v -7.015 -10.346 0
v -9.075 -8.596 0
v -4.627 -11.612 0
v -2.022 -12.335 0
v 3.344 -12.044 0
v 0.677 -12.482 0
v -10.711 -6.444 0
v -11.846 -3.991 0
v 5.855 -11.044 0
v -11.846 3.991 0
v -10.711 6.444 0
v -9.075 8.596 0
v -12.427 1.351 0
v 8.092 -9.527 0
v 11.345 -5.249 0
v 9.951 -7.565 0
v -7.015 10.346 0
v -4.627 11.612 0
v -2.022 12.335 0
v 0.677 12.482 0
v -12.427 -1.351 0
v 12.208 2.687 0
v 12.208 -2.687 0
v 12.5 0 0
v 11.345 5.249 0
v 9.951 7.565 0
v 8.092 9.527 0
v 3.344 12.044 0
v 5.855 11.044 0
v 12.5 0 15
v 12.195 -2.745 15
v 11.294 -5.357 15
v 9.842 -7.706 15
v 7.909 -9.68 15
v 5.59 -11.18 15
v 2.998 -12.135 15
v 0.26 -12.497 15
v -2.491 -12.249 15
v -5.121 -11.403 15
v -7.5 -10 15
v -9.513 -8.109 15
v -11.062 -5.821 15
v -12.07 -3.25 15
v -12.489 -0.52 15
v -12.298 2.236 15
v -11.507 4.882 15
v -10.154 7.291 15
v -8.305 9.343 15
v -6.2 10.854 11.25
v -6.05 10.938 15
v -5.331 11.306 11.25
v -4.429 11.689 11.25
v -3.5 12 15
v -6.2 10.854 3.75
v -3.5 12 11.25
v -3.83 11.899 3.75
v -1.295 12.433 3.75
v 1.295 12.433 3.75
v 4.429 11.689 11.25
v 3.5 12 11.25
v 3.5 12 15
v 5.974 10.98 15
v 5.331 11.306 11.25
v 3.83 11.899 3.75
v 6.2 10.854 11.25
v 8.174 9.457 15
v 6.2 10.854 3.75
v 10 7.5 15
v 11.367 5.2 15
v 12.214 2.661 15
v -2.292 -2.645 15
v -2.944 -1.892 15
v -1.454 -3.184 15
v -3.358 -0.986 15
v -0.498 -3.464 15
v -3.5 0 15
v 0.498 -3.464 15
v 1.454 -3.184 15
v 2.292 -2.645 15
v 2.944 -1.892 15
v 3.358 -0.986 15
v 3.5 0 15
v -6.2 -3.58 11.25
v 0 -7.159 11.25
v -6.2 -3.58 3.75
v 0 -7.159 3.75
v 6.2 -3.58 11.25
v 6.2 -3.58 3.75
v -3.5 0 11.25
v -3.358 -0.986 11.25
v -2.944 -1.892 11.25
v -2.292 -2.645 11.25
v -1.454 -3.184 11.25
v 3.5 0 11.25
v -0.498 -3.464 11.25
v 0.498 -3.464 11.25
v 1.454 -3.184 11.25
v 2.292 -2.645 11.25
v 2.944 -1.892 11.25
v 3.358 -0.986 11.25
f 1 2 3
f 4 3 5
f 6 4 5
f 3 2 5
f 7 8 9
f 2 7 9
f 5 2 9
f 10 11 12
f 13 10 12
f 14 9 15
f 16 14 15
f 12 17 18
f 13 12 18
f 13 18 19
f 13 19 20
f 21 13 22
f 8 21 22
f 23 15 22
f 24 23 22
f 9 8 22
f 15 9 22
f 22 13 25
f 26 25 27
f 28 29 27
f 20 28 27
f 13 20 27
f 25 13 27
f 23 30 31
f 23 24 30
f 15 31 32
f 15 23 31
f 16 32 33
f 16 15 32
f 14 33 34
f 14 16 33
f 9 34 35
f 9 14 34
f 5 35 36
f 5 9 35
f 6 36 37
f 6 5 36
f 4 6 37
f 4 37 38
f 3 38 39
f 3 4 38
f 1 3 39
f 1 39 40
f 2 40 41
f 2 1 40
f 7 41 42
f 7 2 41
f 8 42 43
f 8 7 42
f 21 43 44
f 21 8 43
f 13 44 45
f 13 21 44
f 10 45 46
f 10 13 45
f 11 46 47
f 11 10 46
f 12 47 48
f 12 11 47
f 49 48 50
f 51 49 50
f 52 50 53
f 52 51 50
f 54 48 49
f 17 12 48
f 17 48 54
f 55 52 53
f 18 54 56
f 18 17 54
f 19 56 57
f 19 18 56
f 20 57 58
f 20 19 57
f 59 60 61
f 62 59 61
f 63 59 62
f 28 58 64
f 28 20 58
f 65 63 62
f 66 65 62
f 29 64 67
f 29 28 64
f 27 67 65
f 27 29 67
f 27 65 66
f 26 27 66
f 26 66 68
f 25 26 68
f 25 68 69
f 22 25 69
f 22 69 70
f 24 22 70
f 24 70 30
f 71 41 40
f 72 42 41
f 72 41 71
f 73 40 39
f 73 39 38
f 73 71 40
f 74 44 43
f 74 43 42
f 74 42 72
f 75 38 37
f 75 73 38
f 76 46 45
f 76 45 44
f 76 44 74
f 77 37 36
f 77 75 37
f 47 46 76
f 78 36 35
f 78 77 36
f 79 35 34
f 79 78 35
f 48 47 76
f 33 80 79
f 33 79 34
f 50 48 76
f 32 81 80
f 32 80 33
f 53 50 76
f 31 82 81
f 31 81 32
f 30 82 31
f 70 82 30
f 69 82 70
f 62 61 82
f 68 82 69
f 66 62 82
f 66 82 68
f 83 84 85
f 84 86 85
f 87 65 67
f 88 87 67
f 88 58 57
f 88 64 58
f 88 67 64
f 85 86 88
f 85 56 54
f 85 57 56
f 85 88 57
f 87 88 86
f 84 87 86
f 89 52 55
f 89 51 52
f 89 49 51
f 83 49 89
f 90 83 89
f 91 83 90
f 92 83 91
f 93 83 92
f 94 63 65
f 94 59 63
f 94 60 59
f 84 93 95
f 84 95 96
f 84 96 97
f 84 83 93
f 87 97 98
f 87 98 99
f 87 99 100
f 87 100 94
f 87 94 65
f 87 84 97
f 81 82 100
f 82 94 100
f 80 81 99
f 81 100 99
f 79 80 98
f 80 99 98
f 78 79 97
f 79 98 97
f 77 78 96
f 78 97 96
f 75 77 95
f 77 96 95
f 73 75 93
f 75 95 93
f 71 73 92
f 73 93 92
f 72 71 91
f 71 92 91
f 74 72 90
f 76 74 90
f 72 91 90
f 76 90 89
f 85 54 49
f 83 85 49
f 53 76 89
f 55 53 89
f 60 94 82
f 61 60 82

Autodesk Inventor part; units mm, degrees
ref_plane "YZ Plane" through (0, 0, 0) normal (1, 0, 0) x (0, 1, 0)
ref_plane "XZ Plane" through (0, 0, 0) normal (0, 1, 0) x (-1, 0, 0)
sketch "Sketch1" plane through (0, 0, 0) normal (0, 0, 1) x (1, 0, 0)
  point P0 (0, 0)
sketch "Sketch2" plane through (0, 0, 0) normal (0, 0, 1) x (1, 0, 0)
  circle A0 centre (0, 0) radius 12.5
  dimension "d0" = 25
extrude "Extrusion1" add sketch "Sketch2" along normal blind 15
ref_plane "Work Plane1" through (0, 0, 7.5) normal (0, 0, 1) x (1, 0, 0)
sketch "Sketch3" plane through (0, 0, 7.5) normal (0, 0, 1) x (1, 0, 0)
  line L0 (6.2, -3.5796) -> (0, -7.1591)
  line L1 (0, -7.1591) -> (-6.2, -3.5796)
  line L2 (-6.2, -3.5796) -> (-6.2, 3.5796)
  line L3 (-6.2, 3.5796) -> (0, 7.1591)
  line L4 (0, 7.1591) -> (6.2, 3.5796)
  line L5 (6.2, 3.5796) -> (6.2, -3.5796)
  point P0 (0, 0)
  point P1 (0, 0)
  dimension "d4" = 12.4
extrude "Extrusion2" cut sketch "Sketch3" along normal mid plane 7.5
sketch "Sketch4" plane through (0, 0, 0) normal (0, 1, 0) x (-1, 0, 0)
  line L0 (6.2, 11.25) -> (0, 11.25) projected
  line L1 (-6.2, 3.75) -> (0, 3.75) projected
  line L2 (6.2, 11.25) -> (-6.2, 11.25)
  line L3 (-6.2, 11.25) -> (-6.2, 3.75)
  line L4 (-6.2, 3.75) -> (6.2, 3.75)
  line L5 (6.2, 3.75) -> (6.2, 11.25)
  point P0 (0, 0)
extrude "Extrusion3" cut sketch "Sketch4" along normal blind 15
sketch "Sketch5" plane through (0, 0, 15) normal (0, 0, 1) x (1, 0, 0)
  circle A0 centre (0, 0) radius 12.5 projected
hole "Hole1" at (0, 0, 15) direction (0, 0, -1) diameter 7 depth 7.5
sketch "Sketch6" plane through (0, 0, 15) normal (0, 0, 1) x (1, 0, 0)
  point P0 (0, 0)
sketch "Sketch7" plane through (0, 0, 0) normal (0, 1, 0) x (-1, 0, 0)
  line L0 (3.5, 11.25) -> (-3.5, 11.25) projected
  line L1 (-3.5, 15) -> (3.5, 15) projected
  line L2 (3.5, 11.25) -> (-3.5, 11.25)
  line L3 (-3.5, 11.25) -> (-3.5, 15)
  line L4 (-3.5, 15) -> (3.5, 15)
  line L5 (3.5, 15) -> (3.5, 11.25)
  point P0 (0, 0)
extrude "Extrusion4" cut sketch "Sketch7" along normal blind 15
properties part number "Acople tornillo M8"
